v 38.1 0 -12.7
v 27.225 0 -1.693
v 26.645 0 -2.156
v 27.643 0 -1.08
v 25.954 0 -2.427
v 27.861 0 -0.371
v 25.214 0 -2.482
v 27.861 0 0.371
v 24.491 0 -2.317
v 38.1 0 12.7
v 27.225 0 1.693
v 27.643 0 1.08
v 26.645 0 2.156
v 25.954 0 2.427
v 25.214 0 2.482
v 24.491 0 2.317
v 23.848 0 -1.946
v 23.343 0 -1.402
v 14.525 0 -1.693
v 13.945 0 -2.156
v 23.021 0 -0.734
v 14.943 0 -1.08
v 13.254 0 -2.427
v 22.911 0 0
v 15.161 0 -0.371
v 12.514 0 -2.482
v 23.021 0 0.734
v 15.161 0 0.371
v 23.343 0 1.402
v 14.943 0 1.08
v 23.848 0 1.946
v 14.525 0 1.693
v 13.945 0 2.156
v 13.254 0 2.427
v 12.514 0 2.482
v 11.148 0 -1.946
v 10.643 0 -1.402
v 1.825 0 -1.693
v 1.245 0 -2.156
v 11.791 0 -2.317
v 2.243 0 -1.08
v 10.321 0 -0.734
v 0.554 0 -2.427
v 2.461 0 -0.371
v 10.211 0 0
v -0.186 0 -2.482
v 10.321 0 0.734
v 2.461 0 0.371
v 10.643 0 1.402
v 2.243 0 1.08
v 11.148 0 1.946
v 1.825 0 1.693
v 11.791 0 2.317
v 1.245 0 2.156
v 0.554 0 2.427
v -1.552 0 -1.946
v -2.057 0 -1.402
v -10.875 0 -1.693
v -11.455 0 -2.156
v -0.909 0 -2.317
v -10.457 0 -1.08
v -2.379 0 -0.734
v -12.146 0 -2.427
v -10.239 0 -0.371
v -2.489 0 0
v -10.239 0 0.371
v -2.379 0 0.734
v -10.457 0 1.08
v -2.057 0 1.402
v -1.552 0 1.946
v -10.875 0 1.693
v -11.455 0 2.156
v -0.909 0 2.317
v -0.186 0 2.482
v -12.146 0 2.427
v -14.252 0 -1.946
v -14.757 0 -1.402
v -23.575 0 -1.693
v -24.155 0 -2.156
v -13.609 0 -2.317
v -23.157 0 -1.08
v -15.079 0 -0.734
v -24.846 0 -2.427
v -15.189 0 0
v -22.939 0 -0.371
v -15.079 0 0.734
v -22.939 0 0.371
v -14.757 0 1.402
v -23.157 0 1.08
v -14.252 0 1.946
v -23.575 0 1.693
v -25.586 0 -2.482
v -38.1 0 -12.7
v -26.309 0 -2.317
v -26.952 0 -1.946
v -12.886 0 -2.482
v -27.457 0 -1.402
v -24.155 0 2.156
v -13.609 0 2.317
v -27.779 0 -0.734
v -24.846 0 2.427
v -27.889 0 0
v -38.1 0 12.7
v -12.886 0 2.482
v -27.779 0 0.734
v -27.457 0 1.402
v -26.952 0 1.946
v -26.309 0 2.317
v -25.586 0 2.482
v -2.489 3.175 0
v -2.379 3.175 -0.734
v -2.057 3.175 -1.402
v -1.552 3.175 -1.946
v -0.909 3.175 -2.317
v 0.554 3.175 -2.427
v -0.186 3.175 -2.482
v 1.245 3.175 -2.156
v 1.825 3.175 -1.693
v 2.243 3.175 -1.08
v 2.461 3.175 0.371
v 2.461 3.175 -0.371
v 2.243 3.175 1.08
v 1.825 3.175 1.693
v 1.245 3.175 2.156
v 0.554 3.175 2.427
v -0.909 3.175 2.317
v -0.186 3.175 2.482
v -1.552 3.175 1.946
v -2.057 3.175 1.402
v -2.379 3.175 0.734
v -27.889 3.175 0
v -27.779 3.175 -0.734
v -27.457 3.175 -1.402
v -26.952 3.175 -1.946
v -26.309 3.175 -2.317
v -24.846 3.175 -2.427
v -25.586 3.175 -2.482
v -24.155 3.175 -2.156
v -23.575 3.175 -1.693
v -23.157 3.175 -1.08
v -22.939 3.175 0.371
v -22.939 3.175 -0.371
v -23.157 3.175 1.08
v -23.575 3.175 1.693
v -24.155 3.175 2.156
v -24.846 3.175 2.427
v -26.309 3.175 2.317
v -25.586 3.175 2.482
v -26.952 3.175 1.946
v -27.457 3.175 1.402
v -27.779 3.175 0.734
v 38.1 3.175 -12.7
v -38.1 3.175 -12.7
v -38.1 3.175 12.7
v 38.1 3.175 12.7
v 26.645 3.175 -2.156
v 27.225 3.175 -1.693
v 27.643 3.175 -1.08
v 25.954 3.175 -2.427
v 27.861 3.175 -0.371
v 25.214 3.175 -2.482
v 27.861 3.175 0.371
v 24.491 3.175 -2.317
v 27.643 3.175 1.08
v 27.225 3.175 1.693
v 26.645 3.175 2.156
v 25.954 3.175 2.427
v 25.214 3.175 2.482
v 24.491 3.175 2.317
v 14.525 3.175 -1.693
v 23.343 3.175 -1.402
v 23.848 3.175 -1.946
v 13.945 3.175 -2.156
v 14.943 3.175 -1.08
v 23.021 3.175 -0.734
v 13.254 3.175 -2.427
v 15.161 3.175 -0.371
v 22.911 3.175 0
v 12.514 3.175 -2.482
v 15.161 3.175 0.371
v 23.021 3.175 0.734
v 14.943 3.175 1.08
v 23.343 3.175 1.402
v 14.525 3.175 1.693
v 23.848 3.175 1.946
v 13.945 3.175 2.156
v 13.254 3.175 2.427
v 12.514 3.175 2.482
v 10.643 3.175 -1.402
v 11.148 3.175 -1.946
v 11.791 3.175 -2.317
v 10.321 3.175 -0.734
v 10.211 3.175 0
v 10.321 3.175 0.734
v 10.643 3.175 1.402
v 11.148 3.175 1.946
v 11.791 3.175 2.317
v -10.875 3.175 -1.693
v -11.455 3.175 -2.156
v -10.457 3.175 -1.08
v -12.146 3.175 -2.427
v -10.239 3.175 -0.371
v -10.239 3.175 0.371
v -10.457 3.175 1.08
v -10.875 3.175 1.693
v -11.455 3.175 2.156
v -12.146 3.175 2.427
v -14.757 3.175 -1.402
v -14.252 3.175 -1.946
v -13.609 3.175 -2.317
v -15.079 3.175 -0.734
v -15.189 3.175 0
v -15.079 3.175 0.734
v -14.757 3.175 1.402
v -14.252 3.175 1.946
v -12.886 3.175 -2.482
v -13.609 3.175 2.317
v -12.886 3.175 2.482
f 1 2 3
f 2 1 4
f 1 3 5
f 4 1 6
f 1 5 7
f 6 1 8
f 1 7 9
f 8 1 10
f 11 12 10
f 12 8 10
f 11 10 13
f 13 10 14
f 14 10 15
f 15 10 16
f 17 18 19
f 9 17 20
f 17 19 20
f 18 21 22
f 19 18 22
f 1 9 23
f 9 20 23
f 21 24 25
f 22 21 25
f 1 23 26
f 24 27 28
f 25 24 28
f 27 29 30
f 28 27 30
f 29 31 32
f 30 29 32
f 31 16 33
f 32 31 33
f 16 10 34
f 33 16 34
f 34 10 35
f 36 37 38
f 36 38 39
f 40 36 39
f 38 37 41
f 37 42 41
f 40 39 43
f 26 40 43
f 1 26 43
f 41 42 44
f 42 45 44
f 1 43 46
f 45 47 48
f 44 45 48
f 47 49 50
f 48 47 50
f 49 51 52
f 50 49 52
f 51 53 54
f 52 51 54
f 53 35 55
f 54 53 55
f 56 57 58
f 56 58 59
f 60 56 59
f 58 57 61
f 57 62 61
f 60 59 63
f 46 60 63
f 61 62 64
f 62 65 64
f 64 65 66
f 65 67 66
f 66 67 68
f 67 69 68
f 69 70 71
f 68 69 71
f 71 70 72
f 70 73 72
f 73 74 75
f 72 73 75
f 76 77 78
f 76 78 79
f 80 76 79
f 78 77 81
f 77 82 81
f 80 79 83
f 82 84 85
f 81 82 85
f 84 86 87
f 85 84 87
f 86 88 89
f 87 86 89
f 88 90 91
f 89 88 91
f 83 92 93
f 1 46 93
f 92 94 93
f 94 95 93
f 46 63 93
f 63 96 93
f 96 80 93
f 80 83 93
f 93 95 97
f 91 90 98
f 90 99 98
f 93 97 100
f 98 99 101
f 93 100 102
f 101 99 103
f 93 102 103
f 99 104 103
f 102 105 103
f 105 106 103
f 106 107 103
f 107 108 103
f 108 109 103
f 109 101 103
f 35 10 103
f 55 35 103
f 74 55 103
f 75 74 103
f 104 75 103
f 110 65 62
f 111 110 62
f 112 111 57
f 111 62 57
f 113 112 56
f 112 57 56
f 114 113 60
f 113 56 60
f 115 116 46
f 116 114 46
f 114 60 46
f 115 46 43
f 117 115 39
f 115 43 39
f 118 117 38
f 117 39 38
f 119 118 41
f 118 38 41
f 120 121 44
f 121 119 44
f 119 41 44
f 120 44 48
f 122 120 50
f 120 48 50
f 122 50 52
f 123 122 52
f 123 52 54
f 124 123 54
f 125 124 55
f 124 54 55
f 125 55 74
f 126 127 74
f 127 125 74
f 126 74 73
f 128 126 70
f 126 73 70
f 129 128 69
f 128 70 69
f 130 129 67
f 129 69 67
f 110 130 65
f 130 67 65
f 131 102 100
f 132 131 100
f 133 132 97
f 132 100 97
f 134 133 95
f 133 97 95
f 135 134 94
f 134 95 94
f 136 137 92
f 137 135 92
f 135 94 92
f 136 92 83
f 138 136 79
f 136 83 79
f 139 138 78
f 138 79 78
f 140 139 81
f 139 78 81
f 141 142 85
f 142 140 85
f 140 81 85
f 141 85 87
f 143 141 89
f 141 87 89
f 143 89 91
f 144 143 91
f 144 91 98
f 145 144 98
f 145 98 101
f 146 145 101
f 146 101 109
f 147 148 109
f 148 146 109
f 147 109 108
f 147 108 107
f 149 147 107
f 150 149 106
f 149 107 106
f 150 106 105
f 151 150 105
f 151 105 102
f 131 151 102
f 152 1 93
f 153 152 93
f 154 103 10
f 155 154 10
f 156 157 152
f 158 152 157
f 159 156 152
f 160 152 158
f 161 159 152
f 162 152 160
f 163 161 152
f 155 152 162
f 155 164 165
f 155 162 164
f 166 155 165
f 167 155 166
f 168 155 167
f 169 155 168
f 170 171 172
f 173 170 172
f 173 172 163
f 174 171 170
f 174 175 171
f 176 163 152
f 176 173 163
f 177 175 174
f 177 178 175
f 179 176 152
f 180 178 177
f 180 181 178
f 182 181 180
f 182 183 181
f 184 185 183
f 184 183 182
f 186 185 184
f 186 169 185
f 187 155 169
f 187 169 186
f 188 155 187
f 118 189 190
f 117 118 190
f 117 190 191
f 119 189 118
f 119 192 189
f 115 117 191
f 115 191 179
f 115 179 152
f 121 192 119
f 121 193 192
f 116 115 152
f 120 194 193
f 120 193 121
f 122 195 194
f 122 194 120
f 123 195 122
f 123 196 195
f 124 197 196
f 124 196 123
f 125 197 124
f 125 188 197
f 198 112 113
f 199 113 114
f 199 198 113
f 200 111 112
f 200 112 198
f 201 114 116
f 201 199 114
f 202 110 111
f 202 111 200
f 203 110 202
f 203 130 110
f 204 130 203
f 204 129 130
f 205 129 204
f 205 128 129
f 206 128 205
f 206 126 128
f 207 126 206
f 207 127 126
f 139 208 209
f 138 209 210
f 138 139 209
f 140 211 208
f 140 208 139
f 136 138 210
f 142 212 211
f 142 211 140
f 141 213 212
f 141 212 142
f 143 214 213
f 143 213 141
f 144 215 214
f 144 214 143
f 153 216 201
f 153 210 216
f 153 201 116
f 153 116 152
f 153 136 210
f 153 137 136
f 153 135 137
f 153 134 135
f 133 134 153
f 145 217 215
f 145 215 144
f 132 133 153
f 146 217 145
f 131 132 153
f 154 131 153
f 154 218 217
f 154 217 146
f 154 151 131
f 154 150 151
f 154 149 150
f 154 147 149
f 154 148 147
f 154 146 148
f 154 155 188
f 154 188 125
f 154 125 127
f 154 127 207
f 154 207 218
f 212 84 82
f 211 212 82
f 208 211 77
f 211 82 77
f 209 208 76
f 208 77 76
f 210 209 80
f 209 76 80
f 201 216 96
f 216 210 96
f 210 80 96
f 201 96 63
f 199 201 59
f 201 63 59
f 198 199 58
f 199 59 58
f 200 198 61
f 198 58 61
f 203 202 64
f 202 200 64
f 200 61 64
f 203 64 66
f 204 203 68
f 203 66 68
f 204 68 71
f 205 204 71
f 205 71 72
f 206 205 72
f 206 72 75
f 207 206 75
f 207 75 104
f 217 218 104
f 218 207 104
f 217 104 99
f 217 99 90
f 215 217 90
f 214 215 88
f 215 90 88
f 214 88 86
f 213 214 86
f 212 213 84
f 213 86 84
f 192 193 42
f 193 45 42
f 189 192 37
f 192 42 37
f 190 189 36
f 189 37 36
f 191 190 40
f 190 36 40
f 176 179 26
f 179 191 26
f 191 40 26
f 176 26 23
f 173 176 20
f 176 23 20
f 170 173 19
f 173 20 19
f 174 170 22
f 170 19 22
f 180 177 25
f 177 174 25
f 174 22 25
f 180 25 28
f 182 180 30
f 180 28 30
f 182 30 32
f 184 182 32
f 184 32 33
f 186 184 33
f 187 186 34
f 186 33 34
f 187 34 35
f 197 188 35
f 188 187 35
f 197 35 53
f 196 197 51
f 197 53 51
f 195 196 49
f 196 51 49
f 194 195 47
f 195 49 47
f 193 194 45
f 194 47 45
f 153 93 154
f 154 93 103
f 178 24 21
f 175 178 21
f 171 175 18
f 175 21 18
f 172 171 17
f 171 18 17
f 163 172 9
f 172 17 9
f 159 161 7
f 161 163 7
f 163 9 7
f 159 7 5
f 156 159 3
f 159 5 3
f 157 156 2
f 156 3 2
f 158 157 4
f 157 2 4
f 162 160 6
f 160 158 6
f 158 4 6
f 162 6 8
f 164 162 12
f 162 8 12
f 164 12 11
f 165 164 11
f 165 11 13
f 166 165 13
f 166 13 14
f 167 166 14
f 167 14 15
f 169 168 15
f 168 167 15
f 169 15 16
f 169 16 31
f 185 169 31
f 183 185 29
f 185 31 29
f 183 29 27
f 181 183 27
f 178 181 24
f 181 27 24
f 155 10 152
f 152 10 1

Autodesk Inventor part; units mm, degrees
ref_plane "YZ Plane" through (0, 0, 0) normal (1, 0, 0) x (0, 1, 0)
ref_plane "XZ Plane" through (0, 0, 0) normal (0, 1, 0) x (-1, 0, 0)
ref_plane "XY Plane" through (0, 0, 0) normal (0, 0, 1) x (1, 0, 0)
sketch "Sketch1" plane through (0, 0, 0) normal (0, 1, 0) x (-1, 0, 0)
  line L0 (38.1, 12.7) -> (-38.1, 12.7)
  line L1 (-38.1, 12.7) -> (-38.1, -12.7)
  line L2 (-38.1, -12.7) -> (38.1, -12.7)
  line L3 (38.1, -12.7) -> (38.1, 12.7)
  line L4 (38.1, 12.7) -> (-38.1, -12.7) construction
  line L5 (-38.1, 12.7) -> (38.1, -12.7) construction
  circle A0 centre (25.4, 0) radius 2.4892
  circle A1 centre (12.7, 0) radius 2.4892
  circle A2 centre (0, 0) radius 2.4892
  circle A3 centre (-12.7, 0) radius 2.4892
  circle A4 centre (-25.4, 0) radius 2.4892
  point P0 (0, 0)
  point P1 (38.1, 0)
  dimension "d0" = 76.2
  dimension "d1" = 25.4
  dimension "d2" = 4.9784
  dimension "d3" = 12.7
  dimension "d4" = 12.7
  dimension "d7" = 12.7
  dimension "d12" = 12.7
  dimension "d13" = 12.7
extrude "Extrusion1" add sketch "Sketch1" along normal blind 3.175
properties part number "1x5-Grid-Gusset"
